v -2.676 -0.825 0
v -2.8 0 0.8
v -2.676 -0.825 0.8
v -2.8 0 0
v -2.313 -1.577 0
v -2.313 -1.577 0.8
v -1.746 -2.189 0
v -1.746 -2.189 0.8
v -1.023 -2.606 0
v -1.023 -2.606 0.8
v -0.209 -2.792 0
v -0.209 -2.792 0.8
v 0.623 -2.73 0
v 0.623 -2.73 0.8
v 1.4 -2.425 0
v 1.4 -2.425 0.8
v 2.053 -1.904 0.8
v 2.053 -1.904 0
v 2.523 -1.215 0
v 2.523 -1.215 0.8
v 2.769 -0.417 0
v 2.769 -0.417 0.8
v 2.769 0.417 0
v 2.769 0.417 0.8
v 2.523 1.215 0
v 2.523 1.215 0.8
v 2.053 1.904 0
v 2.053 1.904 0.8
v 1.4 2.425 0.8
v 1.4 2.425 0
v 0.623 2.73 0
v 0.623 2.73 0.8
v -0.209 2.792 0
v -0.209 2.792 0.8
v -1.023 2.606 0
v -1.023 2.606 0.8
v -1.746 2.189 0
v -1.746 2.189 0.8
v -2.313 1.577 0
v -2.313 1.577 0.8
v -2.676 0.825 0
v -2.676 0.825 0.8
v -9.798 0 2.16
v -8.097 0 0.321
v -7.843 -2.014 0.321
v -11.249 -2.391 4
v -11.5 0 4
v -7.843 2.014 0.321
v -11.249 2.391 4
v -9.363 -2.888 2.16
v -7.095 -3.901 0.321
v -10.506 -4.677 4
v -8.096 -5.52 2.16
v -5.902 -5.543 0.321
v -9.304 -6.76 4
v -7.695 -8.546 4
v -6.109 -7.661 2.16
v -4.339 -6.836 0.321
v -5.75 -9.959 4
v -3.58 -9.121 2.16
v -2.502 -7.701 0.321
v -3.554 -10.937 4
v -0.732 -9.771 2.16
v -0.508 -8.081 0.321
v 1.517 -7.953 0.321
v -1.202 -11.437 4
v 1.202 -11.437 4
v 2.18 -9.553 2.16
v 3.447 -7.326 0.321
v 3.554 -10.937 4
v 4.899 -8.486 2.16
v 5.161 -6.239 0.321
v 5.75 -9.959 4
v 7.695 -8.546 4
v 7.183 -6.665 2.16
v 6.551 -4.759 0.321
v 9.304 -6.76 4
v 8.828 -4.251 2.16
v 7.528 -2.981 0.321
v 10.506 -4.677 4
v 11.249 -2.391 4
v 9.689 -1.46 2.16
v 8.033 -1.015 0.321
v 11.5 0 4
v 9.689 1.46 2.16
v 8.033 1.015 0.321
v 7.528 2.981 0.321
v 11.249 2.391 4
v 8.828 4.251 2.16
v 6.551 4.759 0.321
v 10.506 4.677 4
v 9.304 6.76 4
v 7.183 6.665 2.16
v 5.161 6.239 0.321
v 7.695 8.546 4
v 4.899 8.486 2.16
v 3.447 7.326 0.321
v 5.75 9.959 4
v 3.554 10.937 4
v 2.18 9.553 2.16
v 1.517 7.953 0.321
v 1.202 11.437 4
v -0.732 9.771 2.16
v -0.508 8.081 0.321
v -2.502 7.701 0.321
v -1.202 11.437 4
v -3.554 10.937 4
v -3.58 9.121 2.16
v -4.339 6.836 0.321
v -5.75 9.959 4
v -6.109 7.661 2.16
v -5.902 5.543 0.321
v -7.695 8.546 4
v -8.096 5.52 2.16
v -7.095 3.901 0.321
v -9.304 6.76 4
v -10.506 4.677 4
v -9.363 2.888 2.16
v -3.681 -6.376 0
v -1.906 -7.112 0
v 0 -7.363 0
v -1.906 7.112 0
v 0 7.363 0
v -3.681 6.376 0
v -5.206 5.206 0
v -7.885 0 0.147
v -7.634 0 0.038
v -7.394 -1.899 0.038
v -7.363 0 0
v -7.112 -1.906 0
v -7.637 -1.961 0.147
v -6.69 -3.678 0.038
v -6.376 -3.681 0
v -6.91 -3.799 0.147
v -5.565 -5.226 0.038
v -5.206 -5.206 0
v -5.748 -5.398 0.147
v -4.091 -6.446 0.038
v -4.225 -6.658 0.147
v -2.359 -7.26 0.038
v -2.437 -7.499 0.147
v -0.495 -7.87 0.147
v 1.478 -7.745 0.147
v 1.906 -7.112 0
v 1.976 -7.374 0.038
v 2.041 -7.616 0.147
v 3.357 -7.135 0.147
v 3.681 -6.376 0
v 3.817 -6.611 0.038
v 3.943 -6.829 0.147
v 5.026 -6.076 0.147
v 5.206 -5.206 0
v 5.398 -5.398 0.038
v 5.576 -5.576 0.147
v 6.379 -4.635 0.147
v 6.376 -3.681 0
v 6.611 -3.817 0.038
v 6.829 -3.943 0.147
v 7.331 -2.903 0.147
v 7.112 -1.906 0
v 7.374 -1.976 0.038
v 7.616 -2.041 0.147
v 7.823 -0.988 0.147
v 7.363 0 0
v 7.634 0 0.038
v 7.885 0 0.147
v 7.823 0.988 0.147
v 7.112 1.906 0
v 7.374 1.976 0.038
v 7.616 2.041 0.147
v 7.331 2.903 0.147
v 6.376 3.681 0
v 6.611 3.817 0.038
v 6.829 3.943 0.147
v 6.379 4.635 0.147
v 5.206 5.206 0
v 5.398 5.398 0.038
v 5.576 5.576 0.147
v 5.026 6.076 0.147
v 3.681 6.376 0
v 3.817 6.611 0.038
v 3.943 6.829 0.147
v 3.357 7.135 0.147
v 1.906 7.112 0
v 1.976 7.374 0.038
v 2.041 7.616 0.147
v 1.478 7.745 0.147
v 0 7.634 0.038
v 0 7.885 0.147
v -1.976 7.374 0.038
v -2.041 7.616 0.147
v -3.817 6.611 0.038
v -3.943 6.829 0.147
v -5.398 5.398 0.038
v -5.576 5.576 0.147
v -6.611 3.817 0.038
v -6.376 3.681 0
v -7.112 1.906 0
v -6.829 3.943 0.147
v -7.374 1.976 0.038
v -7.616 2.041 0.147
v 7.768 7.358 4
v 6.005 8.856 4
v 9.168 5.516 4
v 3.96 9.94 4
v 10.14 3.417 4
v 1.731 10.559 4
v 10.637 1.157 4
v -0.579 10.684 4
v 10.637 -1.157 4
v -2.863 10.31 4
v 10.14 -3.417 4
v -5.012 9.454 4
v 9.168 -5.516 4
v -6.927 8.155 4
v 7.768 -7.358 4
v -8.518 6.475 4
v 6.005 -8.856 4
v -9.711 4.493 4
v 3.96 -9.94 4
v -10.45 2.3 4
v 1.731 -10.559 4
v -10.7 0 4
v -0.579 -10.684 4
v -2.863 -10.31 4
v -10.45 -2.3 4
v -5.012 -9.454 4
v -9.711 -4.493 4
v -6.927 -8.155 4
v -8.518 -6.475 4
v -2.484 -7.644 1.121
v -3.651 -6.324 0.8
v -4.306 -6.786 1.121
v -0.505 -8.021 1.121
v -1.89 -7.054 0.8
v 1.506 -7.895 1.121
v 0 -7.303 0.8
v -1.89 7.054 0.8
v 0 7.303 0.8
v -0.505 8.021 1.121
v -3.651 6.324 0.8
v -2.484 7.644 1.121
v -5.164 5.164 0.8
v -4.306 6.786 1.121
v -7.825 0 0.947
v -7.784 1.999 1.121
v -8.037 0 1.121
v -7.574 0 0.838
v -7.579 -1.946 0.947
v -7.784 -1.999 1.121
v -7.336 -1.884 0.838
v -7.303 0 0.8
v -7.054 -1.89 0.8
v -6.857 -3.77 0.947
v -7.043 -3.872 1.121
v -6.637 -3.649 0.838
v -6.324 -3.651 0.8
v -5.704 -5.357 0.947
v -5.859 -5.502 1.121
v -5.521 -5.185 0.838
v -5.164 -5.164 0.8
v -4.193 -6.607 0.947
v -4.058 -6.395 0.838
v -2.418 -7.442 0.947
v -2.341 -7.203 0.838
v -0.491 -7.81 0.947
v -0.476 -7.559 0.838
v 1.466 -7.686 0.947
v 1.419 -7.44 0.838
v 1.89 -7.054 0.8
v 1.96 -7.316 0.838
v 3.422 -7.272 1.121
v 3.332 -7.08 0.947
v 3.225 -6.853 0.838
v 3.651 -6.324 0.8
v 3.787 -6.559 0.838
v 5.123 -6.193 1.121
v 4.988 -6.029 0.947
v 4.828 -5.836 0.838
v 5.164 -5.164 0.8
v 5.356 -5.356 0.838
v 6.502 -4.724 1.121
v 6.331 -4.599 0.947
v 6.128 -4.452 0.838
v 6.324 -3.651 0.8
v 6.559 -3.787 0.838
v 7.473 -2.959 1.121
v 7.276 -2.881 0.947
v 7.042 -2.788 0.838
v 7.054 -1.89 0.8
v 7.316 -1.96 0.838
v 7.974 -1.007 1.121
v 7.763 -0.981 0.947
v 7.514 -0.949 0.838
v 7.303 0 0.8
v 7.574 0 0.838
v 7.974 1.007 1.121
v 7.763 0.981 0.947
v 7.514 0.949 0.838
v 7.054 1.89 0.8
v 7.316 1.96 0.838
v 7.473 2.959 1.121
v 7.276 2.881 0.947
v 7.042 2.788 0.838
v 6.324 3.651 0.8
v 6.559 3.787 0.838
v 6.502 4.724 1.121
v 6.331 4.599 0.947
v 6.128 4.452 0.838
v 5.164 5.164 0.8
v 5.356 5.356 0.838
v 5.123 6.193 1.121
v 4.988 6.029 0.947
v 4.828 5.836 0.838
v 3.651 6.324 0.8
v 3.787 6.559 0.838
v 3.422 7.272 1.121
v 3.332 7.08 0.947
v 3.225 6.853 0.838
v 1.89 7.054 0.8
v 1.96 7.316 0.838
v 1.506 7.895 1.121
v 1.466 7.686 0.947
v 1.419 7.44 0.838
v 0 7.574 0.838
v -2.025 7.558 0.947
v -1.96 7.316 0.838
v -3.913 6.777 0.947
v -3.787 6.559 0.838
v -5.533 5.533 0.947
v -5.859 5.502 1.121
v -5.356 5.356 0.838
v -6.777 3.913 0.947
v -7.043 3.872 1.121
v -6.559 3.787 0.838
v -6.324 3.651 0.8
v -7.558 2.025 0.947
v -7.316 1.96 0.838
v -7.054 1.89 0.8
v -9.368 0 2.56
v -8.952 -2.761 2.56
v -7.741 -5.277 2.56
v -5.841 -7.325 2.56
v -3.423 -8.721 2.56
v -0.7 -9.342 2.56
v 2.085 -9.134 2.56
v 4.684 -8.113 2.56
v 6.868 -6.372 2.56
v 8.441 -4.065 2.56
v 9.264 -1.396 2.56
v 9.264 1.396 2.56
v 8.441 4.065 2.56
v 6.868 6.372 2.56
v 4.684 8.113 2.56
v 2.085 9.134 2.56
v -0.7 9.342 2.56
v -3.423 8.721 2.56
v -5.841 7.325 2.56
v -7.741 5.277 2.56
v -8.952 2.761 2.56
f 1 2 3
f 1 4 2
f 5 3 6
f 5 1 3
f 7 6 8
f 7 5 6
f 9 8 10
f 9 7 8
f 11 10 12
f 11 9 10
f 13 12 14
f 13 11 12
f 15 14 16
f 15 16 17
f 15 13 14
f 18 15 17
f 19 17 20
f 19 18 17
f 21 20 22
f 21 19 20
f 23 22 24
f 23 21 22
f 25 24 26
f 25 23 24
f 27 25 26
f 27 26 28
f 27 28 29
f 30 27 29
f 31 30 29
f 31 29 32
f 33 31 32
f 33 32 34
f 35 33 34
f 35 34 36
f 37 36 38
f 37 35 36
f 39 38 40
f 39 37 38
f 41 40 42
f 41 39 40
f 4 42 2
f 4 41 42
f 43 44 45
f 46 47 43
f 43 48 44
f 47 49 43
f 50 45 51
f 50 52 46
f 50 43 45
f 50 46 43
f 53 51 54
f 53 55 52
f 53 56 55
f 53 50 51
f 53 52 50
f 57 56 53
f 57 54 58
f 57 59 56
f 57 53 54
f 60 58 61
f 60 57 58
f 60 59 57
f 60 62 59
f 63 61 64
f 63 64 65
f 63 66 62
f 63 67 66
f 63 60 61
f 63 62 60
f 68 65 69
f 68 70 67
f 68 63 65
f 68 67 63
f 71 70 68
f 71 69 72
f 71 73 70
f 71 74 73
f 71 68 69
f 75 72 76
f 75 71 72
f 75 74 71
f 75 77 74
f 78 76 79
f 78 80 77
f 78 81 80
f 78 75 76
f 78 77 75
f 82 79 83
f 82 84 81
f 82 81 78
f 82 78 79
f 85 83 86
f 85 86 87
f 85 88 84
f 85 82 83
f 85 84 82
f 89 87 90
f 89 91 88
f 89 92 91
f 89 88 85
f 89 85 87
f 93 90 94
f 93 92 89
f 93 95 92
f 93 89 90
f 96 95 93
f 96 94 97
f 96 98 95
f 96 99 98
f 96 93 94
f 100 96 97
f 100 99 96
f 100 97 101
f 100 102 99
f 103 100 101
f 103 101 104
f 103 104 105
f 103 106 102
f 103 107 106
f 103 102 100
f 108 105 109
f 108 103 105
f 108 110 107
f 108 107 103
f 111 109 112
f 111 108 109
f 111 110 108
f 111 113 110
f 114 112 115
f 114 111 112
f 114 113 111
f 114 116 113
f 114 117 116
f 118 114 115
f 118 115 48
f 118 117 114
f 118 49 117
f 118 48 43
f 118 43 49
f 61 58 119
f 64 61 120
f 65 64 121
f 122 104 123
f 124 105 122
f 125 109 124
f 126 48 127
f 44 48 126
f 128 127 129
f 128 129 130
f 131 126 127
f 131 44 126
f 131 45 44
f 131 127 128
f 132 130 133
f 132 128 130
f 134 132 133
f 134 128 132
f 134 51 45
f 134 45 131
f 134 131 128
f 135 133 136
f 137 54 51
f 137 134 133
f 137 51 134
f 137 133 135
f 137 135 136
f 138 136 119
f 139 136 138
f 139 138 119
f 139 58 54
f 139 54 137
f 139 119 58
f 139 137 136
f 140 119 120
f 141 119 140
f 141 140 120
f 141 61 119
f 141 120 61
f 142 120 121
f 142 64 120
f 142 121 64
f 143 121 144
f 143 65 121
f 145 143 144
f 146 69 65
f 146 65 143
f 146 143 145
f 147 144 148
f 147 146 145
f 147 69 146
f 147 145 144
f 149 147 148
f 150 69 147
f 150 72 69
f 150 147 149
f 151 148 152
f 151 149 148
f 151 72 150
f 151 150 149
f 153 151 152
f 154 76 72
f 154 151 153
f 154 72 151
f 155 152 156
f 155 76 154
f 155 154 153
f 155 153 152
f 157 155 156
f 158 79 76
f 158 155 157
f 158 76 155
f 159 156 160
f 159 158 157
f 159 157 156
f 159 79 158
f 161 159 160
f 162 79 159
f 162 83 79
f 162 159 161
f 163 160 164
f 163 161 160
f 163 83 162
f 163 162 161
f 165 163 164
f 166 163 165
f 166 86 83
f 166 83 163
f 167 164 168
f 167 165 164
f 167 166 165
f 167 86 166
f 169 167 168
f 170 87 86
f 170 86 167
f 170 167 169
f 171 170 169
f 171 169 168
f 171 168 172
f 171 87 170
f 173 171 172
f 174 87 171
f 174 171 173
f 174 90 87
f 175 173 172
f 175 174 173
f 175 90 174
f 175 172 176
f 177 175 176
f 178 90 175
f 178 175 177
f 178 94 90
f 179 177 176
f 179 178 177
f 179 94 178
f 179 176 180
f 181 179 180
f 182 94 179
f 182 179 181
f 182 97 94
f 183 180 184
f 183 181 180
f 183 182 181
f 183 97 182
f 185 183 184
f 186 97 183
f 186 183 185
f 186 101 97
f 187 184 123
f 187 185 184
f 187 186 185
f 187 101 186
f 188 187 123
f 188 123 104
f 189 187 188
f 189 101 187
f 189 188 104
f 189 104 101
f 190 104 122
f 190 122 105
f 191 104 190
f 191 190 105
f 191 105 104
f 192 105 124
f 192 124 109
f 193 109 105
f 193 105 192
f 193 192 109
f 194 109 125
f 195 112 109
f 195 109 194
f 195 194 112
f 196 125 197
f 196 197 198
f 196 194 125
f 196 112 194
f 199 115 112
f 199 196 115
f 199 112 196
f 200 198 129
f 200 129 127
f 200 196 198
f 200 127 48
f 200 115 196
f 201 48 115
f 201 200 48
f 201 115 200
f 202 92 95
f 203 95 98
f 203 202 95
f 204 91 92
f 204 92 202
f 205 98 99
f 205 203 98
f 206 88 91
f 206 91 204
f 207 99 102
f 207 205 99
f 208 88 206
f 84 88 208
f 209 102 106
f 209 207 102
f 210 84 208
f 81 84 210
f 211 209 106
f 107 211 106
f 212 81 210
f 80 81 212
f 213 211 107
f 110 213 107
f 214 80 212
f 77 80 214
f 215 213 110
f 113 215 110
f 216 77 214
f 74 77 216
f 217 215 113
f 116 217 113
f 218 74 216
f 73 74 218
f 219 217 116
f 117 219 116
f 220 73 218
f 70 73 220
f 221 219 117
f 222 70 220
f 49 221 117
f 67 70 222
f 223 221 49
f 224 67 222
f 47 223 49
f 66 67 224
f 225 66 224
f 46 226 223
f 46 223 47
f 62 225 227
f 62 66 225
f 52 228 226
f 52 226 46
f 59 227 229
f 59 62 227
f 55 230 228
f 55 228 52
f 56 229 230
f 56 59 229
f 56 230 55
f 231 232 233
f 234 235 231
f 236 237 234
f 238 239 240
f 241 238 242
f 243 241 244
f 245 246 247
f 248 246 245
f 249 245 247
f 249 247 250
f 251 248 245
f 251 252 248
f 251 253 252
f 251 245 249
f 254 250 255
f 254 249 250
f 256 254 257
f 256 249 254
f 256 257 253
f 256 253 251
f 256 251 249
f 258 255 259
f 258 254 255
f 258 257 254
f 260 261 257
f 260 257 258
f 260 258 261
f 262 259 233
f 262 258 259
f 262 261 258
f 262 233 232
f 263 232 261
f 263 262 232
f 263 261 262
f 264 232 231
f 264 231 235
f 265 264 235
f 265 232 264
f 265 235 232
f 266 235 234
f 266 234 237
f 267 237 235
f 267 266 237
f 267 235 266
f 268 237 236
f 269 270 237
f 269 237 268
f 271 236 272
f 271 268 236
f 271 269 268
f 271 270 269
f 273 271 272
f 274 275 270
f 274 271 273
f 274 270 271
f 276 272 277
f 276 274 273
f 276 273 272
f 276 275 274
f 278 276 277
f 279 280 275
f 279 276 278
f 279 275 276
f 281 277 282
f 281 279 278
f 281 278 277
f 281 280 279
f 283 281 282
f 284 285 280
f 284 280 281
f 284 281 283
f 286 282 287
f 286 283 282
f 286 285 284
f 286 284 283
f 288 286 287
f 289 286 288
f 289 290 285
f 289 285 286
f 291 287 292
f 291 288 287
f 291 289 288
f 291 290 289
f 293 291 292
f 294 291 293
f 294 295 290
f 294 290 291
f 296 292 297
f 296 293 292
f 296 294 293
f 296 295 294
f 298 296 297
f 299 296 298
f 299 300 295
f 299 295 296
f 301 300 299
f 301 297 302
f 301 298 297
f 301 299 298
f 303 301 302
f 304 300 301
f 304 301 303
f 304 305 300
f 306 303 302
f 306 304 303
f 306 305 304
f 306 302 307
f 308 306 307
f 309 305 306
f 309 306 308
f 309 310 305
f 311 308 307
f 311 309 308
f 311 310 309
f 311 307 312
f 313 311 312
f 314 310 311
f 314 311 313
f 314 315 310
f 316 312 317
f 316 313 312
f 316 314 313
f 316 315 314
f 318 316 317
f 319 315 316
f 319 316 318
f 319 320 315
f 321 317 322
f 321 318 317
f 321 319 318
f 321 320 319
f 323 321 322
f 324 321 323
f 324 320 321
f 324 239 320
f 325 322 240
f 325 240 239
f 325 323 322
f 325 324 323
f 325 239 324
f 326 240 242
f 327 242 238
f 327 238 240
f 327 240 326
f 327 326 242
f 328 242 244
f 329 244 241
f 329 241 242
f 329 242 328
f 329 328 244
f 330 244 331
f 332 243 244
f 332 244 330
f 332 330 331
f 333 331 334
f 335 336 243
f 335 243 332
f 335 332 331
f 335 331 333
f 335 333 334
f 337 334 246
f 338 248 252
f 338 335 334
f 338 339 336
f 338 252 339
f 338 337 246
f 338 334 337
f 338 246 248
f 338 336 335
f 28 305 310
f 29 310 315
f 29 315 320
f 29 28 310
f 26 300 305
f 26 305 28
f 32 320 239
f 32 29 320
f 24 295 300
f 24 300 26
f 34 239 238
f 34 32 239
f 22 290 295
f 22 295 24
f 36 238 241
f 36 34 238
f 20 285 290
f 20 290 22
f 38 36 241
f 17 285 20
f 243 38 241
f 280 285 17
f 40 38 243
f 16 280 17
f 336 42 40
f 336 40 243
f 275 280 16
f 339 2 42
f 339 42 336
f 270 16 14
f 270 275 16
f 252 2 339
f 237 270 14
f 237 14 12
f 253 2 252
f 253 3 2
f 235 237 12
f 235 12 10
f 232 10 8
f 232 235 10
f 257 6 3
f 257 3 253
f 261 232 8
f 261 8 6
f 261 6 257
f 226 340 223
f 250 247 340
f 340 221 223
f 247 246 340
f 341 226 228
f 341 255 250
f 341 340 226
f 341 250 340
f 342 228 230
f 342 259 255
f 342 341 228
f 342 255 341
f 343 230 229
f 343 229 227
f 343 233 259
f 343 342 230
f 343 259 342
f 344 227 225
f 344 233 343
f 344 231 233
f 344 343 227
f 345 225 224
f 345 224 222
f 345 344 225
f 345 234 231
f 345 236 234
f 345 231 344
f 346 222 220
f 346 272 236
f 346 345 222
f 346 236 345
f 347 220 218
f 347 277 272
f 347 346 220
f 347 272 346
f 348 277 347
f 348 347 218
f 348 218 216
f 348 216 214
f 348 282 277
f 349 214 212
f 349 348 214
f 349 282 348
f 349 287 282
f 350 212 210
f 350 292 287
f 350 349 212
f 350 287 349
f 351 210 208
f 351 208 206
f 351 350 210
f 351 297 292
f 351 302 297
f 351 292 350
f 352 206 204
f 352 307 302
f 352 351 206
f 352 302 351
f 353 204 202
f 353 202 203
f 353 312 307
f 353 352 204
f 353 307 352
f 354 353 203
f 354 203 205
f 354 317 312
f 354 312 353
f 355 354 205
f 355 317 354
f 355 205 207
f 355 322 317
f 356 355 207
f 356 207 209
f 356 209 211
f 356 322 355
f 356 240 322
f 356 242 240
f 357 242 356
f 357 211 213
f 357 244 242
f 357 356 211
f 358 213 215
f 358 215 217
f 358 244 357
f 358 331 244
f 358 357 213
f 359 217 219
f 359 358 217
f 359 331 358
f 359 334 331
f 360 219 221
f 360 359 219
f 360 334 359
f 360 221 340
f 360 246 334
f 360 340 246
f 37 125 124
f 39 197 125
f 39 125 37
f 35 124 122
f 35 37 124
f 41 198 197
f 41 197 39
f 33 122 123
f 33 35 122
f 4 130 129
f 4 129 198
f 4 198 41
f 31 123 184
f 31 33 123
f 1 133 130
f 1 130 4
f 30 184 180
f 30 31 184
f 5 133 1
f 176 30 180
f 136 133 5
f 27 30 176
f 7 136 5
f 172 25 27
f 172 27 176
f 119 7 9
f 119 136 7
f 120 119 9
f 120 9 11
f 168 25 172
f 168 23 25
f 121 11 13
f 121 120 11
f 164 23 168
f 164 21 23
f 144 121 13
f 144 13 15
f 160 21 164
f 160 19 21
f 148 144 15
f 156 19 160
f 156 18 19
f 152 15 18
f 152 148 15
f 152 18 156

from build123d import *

# Parameters (mm, degrees)
FILLET_1_R = 1


with BuildPart() as part:
    # Эскиз4 → Повернуть1 (revolve)
    with BuildSketch(Plane(origin=(0, 0, 0), x_dir=(0, 0, -1), z_dir=(1, 0, 0)), mode=Mode.PRIVATE) as revolve_1_sk:
        Polygon((0, 2.8), (0, 7.8), (-4, 11.5), (-4, 10.7), (-0.8, 7.74), (-0.8, 2.8), align=None)
    revolve(revolve_1_sk.sketch.rotate(Axis((0, 0, 0), (0, 0, 1)), 90), axis=Axis((0, 0, 0), (0, 0, 1)))

    # Скругление1
    fillet_1_edges = [part.edges().sort_by_distance(p)[0] for p in [
        (7.74, 0, 0.8),
        (7.8, 0, 0),
    ]]
    fillet(fillet_1_edges, radius=FILLET_1_R)


solid = part.part
